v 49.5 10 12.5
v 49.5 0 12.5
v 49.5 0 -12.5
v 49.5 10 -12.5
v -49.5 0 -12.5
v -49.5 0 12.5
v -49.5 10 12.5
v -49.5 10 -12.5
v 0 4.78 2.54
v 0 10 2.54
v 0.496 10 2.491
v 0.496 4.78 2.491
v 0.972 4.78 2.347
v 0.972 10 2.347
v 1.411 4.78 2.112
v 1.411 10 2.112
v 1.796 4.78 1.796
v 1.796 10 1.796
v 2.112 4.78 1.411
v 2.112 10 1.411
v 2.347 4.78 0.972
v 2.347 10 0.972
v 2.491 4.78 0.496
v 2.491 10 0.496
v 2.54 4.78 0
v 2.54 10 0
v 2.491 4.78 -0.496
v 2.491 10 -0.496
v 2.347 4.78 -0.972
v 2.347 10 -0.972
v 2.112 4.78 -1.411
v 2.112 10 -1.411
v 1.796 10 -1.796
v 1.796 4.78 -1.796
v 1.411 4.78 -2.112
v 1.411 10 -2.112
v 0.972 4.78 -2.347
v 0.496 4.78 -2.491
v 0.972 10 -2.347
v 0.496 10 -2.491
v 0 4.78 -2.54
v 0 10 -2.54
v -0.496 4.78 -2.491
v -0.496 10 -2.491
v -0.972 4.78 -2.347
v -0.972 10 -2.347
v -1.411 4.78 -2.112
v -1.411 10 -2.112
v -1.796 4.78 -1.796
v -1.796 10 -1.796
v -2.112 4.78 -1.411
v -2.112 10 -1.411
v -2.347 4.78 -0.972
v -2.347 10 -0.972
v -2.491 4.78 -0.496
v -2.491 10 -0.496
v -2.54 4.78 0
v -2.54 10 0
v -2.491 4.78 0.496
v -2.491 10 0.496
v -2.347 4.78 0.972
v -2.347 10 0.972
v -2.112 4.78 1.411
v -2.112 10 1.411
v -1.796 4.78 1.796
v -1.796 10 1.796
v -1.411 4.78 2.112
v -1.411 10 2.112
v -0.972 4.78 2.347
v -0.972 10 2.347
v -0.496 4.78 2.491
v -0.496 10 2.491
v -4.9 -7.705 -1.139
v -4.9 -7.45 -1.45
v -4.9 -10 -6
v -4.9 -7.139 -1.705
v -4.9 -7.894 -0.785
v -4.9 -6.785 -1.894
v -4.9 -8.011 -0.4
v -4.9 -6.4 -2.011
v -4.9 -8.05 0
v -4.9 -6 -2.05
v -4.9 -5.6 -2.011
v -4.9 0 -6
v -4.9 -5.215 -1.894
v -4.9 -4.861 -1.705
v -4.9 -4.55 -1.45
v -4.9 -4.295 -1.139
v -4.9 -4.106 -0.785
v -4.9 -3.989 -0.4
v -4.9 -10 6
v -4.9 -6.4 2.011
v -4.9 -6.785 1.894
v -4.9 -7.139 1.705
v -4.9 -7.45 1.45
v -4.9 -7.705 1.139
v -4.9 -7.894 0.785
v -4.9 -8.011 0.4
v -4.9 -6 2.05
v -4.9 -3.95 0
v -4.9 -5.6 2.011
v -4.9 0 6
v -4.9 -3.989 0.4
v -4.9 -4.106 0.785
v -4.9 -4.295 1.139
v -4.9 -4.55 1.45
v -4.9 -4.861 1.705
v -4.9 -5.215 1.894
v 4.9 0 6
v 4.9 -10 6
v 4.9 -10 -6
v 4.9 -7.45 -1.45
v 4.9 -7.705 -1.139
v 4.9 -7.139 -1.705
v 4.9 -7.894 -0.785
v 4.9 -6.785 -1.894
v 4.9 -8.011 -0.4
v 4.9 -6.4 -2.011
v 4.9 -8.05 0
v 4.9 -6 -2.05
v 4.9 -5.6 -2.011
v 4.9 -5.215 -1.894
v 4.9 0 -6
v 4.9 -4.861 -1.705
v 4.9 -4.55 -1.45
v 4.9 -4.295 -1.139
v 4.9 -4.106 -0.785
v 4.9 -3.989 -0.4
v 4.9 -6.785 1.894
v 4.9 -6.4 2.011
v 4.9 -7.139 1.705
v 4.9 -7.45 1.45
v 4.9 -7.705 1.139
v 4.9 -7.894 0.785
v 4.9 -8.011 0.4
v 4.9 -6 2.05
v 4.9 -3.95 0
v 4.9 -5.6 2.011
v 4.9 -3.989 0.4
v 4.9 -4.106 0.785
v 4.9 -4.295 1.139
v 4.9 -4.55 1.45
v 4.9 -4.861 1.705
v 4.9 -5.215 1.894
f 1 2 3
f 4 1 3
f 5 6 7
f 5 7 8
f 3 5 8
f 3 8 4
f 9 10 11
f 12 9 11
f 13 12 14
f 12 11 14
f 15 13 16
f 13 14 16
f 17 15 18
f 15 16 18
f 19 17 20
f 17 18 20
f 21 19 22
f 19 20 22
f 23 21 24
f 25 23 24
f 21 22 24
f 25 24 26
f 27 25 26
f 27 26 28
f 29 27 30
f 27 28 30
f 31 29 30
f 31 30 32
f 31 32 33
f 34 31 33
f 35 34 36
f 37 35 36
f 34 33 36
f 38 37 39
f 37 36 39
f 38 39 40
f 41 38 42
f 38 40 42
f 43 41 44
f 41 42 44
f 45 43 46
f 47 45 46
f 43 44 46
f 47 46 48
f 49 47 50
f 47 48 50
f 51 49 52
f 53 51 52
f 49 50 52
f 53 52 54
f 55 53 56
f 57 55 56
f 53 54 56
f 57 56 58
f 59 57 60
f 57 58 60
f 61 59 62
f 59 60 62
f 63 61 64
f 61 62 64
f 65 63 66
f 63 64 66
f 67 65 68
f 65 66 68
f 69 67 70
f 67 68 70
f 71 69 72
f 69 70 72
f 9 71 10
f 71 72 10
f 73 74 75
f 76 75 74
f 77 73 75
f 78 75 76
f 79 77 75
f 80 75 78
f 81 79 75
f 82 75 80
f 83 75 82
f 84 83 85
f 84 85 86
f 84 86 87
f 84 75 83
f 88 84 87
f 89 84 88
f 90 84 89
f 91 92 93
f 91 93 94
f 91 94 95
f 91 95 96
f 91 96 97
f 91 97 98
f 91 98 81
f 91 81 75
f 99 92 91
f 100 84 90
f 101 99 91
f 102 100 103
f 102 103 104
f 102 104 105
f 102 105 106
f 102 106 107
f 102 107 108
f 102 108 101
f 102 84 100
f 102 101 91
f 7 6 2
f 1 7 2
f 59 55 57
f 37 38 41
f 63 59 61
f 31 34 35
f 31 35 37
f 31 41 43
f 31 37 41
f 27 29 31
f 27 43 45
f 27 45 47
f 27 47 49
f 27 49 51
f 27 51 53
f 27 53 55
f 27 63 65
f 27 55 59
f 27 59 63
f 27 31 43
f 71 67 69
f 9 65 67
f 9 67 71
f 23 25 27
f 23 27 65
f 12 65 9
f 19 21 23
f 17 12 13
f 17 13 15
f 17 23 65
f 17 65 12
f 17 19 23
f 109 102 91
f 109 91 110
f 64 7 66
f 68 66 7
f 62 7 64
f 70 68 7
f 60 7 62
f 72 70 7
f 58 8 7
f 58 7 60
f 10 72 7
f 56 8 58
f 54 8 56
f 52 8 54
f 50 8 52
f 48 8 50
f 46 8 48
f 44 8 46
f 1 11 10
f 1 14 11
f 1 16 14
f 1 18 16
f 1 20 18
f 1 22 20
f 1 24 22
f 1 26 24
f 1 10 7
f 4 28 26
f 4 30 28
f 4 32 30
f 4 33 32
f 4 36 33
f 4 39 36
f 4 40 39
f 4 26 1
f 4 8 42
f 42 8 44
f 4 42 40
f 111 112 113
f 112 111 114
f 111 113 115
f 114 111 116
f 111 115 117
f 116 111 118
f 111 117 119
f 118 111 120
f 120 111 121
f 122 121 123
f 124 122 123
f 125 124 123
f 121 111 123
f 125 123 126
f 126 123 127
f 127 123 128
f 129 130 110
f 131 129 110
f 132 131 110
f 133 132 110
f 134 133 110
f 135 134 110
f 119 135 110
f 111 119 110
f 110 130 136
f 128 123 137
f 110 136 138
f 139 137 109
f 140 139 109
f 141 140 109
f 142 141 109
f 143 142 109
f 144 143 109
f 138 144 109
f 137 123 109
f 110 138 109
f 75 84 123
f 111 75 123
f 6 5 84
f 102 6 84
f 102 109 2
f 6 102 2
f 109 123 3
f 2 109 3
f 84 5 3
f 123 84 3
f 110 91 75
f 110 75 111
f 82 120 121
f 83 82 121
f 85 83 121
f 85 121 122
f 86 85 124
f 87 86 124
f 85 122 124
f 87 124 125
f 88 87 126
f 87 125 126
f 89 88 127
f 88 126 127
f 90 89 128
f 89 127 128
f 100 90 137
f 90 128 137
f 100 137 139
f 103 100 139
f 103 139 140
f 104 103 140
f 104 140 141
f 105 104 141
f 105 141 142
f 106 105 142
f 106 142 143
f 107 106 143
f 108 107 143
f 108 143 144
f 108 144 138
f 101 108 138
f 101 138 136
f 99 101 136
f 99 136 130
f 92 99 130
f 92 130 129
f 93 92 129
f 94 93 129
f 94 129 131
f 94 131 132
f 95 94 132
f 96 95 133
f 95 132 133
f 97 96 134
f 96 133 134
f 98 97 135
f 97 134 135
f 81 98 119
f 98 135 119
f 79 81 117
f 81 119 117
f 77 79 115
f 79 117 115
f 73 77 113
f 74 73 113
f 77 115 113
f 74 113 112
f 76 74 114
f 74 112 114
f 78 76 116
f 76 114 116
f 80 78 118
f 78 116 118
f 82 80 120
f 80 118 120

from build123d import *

# Parameters (mm, degrees)
SKETCH1_W           = 99
SKETCH1_H           = 25
BOSS_EXTRUDE1_DEPTH = 10
SKETCH9_W           = 9.8
SKETCH9_H           = 12
BOSS_EXTRUDE9_DEPTH = 10
SKETCH10_R          = 2.54
CUT_EXTRUDE1_DEPTH  = 5.22
SKETCH11_R          = 2.05
CUT_EXTRUDE2_DEPTH  = 10


with BuildPart() as part:
    # Sketch1 → Boss-Extrude1 (new body)
    with BuildSketch(Plane(origin=(0, 0, 0), x_dir=(1, 0, 0), z_dir=(0, 1, 0))):
        Rectangle(SKETCH1_W, SKETCH1_H)
    extrude(amount=BOSS_EXTRUDE1_DEPTH)

    # Sketch9 → Boss-Extrude9 (add)
    with BuildSketch(Plane.XZ):
        Rectangle(SKETCH9_W, SKETCH9_H)
    extrude(amount=BOSS_EXTRUDE9_DEPTH)

    # Sketch10 → Cut-Extrude1 (cut)
    with BuildSketch(Plane(origin=(0, 10, 0), x_dir=(1, 0, 0), z_dir=(0, 1, 0))):
        with Locations(Location((0, 0, 0), (0, 0, 270))):
            Circle(SKETCH10_R)
    extrude(amount=-CUT_EXTRUDE1_DEPTH, mode=Mode.SUBTRACT)

    # Sketch11 → Cut-Extrude2 (cut)
    with BuildSketch(Plane(origin=(4.9, 0, 0), x_dir=(0, 0, -1), z_dir=(1, 0, 0))):
        with Locations((0, -6)):
            Circle(SKETCH11_R)
    extrude(amount=-CUT_EXTRUDE2_DEPTH, mode=Mode.SUBTRACT)


solid = part.part
